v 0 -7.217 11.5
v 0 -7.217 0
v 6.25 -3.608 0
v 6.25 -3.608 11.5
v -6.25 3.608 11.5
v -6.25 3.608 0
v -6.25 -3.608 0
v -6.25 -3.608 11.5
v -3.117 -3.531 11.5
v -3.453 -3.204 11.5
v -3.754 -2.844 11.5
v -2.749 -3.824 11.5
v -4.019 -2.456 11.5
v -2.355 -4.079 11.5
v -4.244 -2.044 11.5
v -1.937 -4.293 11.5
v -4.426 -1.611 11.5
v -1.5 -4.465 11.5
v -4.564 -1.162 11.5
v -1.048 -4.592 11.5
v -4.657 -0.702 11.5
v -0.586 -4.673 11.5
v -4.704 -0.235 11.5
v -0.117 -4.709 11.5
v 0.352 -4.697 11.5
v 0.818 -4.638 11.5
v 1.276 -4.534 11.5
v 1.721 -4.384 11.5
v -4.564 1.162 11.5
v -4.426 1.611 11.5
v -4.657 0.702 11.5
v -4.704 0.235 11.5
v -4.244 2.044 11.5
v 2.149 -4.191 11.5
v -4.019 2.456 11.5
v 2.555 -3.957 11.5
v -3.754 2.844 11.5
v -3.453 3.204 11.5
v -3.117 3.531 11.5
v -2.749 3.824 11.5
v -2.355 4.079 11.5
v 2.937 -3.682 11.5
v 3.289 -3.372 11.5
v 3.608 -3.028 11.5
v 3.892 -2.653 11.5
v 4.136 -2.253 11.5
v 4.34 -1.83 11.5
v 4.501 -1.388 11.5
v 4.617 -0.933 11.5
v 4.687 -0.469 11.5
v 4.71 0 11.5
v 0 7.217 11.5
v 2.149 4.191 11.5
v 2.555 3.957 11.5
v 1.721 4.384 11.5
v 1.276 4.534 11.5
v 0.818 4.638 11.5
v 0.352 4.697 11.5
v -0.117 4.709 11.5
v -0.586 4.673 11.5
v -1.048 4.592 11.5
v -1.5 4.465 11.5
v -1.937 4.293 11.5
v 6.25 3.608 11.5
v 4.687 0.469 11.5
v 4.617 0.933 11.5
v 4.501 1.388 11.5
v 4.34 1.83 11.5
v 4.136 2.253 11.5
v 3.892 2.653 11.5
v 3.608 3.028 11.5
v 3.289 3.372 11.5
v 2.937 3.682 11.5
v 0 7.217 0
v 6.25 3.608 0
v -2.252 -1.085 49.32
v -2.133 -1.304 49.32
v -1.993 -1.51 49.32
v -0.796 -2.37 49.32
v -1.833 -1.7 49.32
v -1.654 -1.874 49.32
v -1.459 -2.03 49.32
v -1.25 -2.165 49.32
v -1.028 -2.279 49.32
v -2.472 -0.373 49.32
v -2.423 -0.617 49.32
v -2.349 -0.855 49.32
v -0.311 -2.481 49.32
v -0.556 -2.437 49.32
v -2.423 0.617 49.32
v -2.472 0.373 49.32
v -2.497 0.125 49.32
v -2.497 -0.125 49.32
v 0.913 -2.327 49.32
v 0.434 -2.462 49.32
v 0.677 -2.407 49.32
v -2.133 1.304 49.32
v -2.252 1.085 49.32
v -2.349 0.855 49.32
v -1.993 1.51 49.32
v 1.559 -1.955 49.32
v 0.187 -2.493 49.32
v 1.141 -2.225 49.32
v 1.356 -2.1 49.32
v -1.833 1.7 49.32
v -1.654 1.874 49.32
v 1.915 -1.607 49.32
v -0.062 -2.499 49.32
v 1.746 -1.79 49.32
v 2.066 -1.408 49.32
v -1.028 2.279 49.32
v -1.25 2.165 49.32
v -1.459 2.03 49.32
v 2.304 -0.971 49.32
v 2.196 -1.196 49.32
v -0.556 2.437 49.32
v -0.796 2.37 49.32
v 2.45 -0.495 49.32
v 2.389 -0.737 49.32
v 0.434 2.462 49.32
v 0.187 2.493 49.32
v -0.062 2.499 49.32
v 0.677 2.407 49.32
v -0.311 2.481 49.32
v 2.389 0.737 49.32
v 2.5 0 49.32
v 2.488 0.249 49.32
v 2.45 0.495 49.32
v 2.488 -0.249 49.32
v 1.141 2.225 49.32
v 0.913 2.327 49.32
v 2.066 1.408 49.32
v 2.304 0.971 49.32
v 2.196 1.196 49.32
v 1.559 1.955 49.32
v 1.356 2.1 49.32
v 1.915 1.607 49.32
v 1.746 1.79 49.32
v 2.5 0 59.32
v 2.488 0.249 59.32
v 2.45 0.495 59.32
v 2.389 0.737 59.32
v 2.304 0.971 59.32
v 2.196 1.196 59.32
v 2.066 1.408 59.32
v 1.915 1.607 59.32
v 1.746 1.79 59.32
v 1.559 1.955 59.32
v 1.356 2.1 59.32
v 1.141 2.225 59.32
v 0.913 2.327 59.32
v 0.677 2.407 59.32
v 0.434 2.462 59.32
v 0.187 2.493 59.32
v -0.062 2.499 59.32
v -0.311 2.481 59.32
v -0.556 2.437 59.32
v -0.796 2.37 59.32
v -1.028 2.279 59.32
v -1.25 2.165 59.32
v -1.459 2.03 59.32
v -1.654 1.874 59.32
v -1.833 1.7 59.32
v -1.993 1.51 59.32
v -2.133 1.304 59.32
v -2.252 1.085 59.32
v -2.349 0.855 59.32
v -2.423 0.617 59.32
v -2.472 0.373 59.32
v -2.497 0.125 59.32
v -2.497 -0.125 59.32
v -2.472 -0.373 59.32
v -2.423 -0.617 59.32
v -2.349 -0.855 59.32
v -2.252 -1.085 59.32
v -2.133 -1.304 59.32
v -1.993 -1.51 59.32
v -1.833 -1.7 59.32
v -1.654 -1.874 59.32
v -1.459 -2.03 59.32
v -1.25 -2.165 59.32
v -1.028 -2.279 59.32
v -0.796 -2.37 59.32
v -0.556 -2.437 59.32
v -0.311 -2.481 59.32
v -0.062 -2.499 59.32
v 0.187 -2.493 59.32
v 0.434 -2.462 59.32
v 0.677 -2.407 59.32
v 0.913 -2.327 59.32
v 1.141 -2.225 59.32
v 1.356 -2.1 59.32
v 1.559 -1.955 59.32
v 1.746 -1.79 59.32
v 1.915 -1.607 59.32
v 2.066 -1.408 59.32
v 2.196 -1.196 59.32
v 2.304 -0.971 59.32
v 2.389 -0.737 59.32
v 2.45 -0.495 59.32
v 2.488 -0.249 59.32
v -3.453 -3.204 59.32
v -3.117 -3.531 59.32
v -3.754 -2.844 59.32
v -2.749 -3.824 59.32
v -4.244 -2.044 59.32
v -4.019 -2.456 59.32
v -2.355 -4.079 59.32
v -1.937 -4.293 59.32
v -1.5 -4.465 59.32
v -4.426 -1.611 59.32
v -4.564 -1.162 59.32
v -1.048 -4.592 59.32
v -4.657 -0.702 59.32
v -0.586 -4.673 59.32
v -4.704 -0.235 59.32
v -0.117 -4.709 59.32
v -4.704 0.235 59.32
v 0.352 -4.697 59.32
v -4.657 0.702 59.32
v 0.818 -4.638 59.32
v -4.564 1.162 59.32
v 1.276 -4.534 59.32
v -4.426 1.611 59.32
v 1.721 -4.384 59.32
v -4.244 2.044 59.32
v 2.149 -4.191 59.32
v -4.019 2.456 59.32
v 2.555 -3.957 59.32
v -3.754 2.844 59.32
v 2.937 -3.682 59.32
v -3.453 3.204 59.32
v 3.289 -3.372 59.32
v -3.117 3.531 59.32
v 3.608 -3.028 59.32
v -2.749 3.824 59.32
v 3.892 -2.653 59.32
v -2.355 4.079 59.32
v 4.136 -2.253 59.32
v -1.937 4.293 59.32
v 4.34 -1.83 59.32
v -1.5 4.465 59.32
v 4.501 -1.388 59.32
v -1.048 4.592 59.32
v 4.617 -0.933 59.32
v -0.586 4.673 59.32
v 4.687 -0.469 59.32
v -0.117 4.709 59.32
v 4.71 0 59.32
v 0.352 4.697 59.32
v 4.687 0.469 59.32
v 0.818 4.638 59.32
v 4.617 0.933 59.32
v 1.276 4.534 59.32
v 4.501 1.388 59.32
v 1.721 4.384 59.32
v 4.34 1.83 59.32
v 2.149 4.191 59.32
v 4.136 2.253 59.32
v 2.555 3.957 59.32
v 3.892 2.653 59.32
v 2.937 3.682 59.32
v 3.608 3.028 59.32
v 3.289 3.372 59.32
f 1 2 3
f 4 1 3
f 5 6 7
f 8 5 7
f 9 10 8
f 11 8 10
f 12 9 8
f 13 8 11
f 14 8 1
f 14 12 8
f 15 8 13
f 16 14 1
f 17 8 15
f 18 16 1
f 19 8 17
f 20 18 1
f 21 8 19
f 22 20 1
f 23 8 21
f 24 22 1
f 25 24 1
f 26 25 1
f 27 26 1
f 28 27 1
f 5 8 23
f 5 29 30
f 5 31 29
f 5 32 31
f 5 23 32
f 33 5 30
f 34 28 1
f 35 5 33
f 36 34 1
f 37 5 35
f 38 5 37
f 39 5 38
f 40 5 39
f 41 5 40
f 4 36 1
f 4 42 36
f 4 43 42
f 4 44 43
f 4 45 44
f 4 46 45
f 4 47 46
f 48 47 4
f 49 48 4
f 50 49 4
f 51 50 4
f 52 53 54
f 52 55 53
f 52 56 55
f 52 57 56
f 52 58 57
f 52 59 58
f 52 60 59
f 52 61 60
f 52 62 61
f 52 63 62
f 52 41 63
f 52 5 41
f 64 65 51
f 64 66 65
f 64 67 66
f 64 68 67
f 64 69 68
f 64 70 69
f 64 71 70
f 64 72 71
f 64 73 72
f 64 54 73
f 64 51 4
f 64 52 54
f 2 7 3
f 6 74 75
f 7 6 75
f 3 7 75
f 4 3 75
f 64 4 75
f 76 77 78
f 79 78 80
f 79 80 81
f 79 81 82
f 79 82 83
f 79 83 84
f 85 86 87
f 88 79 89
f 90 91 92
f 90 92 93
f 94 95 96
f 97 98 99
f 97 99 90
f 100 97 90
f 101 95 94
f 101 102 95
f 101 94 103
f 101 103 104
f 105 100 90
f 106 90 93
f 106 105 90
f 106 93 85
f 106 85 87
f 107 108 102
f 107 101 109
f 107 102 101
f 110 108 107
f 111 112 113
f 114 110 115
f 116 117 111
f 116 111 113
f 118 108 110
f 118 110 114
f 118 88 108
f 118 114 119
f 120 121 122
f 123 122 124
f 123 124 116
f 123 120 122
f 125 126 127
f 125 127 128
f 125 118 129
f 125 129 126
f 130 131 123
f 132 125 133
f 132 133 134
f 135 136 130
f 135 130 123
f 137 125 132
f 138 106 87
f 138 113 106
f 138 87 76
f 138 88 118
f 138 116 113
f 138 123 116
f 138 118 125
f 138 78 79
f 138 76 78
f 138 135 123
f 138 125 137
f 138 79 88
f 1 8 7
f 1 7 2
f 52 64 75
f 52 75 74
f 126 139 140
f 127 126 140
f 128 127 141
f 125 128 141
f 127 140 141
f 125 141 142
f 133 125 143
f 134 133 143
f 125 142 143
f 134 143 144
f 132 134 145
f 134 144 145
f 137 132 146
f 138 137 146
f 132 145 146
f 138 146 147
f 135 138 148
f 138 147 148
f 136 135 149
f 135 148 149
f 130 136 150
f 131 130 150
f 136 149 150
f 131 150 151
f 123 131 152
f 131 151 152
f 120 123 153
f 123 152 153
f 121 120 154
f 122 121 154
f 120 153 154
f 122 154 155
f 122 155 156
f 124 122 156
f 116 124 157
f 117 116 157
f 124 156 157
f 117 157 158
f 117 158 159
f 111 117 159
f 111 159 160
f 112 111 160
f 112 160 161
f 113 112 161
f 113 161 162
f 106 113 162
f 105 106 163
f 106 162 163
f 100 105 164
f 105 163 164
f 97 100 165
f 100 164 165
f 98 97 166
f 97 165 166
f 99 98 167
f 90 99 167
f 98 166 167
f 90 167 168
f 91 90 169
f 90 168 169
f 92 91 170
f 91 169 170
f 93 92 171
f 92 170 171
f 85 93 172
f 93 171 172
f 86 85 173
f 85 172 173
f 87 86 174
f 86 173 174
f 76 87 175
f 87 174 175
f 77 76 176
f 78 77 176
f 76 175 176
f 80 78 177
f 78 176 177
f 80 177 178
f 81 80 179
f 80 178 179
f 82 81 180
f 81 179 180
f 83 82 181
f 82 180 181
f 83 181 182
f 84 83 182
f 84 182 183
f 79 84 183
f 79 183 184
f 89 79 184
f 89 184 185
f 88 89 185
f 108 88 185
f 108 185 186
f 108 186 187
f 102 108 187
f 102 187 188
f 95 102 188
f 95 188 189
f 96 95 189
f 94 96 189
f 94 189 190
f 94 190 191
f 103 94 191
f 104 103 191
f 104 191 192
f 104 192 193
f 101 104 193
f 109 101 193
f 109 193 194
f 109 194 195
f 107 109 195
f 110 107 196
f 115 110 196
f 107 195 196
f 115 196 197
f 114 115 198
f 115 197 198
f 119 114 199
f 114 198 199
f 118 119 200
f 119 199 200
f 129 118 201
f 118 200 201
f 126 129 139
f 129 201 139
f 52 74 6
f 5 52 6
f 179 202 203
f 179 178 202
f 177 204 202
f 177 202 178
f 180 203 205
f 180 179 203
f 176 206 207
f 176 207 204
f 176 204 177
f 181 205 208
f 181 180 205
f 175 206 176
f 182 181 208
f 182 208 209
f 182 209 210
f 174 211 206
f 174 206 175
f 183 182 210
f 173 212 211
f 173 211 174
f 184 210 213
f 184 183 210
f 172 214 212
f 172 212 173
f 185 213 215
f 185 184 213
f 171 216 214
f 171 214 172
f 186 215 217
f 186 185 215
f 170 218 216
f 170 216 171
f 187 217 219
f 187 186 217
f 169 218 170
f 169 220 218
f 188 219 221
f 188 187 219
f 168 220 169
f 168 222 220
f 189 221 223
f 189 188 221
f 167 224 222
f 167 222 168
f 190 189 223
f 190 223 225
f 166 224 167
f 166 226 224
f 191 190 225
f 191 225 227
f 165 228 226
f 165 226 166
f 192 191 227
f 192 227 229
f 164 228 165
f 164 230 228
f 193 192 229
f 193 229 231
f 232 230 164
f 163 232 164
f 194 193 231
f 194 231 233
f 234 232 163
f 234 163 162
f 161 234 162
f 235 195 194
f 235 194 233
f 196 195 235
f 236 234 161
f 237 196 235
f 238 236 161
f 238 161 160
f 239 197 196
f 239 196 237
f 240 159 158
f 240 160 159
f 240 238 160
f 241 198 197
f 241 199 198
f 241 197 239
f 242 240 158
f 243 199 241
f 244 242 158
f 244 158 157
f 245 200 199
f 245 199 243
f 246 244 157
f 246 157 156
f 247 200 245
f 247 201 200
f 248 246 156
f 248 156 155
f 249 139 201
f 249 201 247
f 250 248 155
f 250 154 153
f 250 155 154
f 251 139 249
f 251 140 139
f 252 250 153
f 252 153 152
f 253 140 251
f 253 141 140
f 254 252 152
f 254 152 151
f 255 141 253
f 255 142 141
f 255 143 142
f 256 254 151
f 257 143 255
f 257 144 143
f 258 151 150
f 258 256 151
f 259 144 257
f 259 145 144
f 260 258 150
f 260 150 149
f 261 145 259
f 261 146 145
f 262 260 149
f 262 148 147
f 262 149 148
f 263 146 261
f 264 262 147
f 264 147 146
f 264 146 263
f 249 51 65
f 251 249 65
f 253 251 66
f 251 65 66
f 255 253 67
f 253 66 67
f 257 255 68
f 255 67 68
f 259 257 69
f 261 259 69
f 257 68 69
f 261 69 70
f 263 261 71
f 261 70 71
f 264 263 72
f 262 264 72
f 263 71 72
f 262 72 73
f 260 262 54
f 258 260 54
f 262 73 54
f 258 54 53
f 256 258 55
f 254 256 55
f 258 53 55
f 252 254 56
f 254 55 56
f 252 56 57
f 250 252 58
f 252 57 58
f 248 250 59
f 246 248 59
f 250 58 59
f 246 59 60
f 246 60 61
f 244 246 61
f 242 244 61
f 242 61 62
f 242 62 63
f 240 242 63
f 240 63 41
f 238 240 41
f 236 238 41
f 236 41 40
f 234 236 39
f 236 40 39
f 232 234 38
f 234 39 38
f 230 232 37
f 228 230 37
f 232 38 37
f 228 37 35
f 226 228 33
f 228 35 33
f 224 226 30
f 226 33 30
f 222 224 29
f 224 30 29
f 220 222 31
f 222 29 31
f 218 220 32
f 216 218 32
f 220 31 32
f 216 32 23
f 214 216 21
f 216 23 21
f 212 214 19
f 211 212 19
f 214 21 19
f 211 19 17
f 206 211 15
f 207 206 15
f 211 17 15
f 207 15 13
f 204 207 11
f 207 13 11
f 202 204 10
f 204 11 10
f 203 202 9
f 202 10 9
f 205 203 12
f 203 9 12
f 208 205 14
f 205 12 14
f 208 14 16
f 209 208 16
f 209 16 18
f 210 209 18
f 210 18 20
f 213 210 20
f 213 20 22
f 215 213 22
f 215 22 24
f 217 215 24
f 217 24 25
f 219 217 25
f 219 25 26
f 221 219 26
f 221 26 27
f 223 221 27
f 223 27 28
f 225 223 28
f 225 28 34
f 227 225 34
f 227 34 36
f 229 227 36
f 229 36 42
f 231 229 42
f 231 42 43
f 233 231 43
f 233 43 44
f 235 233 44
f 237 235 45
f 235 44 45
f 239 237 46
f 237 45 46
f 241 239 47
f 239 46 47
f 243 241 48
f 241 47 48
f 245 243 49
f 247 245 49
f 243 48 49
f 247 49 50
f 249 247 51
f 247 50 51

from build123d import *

# Parameters (mm, degrees)
SALIENTE_EXTRUIR1_DEPTH = 11.5
CROQUIS2_R              = 4.71
SALIENTE_EXTRUIR2_DEPTH = 47.82
CROQUIS3_R              = 2.5
CORTAR_EXTRUIR1_DEPTH   = 10


with BuildPart() as part:
    # Croquis1 → Saliente-Extruir1 (new body)
    with BuildSketch(Plane.XY):
        Polygon((0, 7.216878365), (-6.25, 3.608439182), (-6.25, -3.608439182), (0, -7.216878365), (6.25, -3.608439182), (6.25, 3.608439182), align=None)
    extrude(amount=SALIENTE_EXTRUIR1_DEPTH)

    # Croquis2 → Saliente-Extruir2 (add)
    with BuildSketch(Plane.XY.offset(11.5)):
        Circle(CROQUIS2_R)
    extrude(amount=SALIENTE_EXTRUIR2_DEPTH)

    # Croquis3 → Cortar-Extruir1 (cut)
    with BuildSketch(Plane.XY.offset(59.32)):
        Circle(CROQUIS3_R)
    extrude(amount=-CORTAR_EXTRUIR1_DEPTH, mode=Mode.SUBTRACT)


solid = part.part
